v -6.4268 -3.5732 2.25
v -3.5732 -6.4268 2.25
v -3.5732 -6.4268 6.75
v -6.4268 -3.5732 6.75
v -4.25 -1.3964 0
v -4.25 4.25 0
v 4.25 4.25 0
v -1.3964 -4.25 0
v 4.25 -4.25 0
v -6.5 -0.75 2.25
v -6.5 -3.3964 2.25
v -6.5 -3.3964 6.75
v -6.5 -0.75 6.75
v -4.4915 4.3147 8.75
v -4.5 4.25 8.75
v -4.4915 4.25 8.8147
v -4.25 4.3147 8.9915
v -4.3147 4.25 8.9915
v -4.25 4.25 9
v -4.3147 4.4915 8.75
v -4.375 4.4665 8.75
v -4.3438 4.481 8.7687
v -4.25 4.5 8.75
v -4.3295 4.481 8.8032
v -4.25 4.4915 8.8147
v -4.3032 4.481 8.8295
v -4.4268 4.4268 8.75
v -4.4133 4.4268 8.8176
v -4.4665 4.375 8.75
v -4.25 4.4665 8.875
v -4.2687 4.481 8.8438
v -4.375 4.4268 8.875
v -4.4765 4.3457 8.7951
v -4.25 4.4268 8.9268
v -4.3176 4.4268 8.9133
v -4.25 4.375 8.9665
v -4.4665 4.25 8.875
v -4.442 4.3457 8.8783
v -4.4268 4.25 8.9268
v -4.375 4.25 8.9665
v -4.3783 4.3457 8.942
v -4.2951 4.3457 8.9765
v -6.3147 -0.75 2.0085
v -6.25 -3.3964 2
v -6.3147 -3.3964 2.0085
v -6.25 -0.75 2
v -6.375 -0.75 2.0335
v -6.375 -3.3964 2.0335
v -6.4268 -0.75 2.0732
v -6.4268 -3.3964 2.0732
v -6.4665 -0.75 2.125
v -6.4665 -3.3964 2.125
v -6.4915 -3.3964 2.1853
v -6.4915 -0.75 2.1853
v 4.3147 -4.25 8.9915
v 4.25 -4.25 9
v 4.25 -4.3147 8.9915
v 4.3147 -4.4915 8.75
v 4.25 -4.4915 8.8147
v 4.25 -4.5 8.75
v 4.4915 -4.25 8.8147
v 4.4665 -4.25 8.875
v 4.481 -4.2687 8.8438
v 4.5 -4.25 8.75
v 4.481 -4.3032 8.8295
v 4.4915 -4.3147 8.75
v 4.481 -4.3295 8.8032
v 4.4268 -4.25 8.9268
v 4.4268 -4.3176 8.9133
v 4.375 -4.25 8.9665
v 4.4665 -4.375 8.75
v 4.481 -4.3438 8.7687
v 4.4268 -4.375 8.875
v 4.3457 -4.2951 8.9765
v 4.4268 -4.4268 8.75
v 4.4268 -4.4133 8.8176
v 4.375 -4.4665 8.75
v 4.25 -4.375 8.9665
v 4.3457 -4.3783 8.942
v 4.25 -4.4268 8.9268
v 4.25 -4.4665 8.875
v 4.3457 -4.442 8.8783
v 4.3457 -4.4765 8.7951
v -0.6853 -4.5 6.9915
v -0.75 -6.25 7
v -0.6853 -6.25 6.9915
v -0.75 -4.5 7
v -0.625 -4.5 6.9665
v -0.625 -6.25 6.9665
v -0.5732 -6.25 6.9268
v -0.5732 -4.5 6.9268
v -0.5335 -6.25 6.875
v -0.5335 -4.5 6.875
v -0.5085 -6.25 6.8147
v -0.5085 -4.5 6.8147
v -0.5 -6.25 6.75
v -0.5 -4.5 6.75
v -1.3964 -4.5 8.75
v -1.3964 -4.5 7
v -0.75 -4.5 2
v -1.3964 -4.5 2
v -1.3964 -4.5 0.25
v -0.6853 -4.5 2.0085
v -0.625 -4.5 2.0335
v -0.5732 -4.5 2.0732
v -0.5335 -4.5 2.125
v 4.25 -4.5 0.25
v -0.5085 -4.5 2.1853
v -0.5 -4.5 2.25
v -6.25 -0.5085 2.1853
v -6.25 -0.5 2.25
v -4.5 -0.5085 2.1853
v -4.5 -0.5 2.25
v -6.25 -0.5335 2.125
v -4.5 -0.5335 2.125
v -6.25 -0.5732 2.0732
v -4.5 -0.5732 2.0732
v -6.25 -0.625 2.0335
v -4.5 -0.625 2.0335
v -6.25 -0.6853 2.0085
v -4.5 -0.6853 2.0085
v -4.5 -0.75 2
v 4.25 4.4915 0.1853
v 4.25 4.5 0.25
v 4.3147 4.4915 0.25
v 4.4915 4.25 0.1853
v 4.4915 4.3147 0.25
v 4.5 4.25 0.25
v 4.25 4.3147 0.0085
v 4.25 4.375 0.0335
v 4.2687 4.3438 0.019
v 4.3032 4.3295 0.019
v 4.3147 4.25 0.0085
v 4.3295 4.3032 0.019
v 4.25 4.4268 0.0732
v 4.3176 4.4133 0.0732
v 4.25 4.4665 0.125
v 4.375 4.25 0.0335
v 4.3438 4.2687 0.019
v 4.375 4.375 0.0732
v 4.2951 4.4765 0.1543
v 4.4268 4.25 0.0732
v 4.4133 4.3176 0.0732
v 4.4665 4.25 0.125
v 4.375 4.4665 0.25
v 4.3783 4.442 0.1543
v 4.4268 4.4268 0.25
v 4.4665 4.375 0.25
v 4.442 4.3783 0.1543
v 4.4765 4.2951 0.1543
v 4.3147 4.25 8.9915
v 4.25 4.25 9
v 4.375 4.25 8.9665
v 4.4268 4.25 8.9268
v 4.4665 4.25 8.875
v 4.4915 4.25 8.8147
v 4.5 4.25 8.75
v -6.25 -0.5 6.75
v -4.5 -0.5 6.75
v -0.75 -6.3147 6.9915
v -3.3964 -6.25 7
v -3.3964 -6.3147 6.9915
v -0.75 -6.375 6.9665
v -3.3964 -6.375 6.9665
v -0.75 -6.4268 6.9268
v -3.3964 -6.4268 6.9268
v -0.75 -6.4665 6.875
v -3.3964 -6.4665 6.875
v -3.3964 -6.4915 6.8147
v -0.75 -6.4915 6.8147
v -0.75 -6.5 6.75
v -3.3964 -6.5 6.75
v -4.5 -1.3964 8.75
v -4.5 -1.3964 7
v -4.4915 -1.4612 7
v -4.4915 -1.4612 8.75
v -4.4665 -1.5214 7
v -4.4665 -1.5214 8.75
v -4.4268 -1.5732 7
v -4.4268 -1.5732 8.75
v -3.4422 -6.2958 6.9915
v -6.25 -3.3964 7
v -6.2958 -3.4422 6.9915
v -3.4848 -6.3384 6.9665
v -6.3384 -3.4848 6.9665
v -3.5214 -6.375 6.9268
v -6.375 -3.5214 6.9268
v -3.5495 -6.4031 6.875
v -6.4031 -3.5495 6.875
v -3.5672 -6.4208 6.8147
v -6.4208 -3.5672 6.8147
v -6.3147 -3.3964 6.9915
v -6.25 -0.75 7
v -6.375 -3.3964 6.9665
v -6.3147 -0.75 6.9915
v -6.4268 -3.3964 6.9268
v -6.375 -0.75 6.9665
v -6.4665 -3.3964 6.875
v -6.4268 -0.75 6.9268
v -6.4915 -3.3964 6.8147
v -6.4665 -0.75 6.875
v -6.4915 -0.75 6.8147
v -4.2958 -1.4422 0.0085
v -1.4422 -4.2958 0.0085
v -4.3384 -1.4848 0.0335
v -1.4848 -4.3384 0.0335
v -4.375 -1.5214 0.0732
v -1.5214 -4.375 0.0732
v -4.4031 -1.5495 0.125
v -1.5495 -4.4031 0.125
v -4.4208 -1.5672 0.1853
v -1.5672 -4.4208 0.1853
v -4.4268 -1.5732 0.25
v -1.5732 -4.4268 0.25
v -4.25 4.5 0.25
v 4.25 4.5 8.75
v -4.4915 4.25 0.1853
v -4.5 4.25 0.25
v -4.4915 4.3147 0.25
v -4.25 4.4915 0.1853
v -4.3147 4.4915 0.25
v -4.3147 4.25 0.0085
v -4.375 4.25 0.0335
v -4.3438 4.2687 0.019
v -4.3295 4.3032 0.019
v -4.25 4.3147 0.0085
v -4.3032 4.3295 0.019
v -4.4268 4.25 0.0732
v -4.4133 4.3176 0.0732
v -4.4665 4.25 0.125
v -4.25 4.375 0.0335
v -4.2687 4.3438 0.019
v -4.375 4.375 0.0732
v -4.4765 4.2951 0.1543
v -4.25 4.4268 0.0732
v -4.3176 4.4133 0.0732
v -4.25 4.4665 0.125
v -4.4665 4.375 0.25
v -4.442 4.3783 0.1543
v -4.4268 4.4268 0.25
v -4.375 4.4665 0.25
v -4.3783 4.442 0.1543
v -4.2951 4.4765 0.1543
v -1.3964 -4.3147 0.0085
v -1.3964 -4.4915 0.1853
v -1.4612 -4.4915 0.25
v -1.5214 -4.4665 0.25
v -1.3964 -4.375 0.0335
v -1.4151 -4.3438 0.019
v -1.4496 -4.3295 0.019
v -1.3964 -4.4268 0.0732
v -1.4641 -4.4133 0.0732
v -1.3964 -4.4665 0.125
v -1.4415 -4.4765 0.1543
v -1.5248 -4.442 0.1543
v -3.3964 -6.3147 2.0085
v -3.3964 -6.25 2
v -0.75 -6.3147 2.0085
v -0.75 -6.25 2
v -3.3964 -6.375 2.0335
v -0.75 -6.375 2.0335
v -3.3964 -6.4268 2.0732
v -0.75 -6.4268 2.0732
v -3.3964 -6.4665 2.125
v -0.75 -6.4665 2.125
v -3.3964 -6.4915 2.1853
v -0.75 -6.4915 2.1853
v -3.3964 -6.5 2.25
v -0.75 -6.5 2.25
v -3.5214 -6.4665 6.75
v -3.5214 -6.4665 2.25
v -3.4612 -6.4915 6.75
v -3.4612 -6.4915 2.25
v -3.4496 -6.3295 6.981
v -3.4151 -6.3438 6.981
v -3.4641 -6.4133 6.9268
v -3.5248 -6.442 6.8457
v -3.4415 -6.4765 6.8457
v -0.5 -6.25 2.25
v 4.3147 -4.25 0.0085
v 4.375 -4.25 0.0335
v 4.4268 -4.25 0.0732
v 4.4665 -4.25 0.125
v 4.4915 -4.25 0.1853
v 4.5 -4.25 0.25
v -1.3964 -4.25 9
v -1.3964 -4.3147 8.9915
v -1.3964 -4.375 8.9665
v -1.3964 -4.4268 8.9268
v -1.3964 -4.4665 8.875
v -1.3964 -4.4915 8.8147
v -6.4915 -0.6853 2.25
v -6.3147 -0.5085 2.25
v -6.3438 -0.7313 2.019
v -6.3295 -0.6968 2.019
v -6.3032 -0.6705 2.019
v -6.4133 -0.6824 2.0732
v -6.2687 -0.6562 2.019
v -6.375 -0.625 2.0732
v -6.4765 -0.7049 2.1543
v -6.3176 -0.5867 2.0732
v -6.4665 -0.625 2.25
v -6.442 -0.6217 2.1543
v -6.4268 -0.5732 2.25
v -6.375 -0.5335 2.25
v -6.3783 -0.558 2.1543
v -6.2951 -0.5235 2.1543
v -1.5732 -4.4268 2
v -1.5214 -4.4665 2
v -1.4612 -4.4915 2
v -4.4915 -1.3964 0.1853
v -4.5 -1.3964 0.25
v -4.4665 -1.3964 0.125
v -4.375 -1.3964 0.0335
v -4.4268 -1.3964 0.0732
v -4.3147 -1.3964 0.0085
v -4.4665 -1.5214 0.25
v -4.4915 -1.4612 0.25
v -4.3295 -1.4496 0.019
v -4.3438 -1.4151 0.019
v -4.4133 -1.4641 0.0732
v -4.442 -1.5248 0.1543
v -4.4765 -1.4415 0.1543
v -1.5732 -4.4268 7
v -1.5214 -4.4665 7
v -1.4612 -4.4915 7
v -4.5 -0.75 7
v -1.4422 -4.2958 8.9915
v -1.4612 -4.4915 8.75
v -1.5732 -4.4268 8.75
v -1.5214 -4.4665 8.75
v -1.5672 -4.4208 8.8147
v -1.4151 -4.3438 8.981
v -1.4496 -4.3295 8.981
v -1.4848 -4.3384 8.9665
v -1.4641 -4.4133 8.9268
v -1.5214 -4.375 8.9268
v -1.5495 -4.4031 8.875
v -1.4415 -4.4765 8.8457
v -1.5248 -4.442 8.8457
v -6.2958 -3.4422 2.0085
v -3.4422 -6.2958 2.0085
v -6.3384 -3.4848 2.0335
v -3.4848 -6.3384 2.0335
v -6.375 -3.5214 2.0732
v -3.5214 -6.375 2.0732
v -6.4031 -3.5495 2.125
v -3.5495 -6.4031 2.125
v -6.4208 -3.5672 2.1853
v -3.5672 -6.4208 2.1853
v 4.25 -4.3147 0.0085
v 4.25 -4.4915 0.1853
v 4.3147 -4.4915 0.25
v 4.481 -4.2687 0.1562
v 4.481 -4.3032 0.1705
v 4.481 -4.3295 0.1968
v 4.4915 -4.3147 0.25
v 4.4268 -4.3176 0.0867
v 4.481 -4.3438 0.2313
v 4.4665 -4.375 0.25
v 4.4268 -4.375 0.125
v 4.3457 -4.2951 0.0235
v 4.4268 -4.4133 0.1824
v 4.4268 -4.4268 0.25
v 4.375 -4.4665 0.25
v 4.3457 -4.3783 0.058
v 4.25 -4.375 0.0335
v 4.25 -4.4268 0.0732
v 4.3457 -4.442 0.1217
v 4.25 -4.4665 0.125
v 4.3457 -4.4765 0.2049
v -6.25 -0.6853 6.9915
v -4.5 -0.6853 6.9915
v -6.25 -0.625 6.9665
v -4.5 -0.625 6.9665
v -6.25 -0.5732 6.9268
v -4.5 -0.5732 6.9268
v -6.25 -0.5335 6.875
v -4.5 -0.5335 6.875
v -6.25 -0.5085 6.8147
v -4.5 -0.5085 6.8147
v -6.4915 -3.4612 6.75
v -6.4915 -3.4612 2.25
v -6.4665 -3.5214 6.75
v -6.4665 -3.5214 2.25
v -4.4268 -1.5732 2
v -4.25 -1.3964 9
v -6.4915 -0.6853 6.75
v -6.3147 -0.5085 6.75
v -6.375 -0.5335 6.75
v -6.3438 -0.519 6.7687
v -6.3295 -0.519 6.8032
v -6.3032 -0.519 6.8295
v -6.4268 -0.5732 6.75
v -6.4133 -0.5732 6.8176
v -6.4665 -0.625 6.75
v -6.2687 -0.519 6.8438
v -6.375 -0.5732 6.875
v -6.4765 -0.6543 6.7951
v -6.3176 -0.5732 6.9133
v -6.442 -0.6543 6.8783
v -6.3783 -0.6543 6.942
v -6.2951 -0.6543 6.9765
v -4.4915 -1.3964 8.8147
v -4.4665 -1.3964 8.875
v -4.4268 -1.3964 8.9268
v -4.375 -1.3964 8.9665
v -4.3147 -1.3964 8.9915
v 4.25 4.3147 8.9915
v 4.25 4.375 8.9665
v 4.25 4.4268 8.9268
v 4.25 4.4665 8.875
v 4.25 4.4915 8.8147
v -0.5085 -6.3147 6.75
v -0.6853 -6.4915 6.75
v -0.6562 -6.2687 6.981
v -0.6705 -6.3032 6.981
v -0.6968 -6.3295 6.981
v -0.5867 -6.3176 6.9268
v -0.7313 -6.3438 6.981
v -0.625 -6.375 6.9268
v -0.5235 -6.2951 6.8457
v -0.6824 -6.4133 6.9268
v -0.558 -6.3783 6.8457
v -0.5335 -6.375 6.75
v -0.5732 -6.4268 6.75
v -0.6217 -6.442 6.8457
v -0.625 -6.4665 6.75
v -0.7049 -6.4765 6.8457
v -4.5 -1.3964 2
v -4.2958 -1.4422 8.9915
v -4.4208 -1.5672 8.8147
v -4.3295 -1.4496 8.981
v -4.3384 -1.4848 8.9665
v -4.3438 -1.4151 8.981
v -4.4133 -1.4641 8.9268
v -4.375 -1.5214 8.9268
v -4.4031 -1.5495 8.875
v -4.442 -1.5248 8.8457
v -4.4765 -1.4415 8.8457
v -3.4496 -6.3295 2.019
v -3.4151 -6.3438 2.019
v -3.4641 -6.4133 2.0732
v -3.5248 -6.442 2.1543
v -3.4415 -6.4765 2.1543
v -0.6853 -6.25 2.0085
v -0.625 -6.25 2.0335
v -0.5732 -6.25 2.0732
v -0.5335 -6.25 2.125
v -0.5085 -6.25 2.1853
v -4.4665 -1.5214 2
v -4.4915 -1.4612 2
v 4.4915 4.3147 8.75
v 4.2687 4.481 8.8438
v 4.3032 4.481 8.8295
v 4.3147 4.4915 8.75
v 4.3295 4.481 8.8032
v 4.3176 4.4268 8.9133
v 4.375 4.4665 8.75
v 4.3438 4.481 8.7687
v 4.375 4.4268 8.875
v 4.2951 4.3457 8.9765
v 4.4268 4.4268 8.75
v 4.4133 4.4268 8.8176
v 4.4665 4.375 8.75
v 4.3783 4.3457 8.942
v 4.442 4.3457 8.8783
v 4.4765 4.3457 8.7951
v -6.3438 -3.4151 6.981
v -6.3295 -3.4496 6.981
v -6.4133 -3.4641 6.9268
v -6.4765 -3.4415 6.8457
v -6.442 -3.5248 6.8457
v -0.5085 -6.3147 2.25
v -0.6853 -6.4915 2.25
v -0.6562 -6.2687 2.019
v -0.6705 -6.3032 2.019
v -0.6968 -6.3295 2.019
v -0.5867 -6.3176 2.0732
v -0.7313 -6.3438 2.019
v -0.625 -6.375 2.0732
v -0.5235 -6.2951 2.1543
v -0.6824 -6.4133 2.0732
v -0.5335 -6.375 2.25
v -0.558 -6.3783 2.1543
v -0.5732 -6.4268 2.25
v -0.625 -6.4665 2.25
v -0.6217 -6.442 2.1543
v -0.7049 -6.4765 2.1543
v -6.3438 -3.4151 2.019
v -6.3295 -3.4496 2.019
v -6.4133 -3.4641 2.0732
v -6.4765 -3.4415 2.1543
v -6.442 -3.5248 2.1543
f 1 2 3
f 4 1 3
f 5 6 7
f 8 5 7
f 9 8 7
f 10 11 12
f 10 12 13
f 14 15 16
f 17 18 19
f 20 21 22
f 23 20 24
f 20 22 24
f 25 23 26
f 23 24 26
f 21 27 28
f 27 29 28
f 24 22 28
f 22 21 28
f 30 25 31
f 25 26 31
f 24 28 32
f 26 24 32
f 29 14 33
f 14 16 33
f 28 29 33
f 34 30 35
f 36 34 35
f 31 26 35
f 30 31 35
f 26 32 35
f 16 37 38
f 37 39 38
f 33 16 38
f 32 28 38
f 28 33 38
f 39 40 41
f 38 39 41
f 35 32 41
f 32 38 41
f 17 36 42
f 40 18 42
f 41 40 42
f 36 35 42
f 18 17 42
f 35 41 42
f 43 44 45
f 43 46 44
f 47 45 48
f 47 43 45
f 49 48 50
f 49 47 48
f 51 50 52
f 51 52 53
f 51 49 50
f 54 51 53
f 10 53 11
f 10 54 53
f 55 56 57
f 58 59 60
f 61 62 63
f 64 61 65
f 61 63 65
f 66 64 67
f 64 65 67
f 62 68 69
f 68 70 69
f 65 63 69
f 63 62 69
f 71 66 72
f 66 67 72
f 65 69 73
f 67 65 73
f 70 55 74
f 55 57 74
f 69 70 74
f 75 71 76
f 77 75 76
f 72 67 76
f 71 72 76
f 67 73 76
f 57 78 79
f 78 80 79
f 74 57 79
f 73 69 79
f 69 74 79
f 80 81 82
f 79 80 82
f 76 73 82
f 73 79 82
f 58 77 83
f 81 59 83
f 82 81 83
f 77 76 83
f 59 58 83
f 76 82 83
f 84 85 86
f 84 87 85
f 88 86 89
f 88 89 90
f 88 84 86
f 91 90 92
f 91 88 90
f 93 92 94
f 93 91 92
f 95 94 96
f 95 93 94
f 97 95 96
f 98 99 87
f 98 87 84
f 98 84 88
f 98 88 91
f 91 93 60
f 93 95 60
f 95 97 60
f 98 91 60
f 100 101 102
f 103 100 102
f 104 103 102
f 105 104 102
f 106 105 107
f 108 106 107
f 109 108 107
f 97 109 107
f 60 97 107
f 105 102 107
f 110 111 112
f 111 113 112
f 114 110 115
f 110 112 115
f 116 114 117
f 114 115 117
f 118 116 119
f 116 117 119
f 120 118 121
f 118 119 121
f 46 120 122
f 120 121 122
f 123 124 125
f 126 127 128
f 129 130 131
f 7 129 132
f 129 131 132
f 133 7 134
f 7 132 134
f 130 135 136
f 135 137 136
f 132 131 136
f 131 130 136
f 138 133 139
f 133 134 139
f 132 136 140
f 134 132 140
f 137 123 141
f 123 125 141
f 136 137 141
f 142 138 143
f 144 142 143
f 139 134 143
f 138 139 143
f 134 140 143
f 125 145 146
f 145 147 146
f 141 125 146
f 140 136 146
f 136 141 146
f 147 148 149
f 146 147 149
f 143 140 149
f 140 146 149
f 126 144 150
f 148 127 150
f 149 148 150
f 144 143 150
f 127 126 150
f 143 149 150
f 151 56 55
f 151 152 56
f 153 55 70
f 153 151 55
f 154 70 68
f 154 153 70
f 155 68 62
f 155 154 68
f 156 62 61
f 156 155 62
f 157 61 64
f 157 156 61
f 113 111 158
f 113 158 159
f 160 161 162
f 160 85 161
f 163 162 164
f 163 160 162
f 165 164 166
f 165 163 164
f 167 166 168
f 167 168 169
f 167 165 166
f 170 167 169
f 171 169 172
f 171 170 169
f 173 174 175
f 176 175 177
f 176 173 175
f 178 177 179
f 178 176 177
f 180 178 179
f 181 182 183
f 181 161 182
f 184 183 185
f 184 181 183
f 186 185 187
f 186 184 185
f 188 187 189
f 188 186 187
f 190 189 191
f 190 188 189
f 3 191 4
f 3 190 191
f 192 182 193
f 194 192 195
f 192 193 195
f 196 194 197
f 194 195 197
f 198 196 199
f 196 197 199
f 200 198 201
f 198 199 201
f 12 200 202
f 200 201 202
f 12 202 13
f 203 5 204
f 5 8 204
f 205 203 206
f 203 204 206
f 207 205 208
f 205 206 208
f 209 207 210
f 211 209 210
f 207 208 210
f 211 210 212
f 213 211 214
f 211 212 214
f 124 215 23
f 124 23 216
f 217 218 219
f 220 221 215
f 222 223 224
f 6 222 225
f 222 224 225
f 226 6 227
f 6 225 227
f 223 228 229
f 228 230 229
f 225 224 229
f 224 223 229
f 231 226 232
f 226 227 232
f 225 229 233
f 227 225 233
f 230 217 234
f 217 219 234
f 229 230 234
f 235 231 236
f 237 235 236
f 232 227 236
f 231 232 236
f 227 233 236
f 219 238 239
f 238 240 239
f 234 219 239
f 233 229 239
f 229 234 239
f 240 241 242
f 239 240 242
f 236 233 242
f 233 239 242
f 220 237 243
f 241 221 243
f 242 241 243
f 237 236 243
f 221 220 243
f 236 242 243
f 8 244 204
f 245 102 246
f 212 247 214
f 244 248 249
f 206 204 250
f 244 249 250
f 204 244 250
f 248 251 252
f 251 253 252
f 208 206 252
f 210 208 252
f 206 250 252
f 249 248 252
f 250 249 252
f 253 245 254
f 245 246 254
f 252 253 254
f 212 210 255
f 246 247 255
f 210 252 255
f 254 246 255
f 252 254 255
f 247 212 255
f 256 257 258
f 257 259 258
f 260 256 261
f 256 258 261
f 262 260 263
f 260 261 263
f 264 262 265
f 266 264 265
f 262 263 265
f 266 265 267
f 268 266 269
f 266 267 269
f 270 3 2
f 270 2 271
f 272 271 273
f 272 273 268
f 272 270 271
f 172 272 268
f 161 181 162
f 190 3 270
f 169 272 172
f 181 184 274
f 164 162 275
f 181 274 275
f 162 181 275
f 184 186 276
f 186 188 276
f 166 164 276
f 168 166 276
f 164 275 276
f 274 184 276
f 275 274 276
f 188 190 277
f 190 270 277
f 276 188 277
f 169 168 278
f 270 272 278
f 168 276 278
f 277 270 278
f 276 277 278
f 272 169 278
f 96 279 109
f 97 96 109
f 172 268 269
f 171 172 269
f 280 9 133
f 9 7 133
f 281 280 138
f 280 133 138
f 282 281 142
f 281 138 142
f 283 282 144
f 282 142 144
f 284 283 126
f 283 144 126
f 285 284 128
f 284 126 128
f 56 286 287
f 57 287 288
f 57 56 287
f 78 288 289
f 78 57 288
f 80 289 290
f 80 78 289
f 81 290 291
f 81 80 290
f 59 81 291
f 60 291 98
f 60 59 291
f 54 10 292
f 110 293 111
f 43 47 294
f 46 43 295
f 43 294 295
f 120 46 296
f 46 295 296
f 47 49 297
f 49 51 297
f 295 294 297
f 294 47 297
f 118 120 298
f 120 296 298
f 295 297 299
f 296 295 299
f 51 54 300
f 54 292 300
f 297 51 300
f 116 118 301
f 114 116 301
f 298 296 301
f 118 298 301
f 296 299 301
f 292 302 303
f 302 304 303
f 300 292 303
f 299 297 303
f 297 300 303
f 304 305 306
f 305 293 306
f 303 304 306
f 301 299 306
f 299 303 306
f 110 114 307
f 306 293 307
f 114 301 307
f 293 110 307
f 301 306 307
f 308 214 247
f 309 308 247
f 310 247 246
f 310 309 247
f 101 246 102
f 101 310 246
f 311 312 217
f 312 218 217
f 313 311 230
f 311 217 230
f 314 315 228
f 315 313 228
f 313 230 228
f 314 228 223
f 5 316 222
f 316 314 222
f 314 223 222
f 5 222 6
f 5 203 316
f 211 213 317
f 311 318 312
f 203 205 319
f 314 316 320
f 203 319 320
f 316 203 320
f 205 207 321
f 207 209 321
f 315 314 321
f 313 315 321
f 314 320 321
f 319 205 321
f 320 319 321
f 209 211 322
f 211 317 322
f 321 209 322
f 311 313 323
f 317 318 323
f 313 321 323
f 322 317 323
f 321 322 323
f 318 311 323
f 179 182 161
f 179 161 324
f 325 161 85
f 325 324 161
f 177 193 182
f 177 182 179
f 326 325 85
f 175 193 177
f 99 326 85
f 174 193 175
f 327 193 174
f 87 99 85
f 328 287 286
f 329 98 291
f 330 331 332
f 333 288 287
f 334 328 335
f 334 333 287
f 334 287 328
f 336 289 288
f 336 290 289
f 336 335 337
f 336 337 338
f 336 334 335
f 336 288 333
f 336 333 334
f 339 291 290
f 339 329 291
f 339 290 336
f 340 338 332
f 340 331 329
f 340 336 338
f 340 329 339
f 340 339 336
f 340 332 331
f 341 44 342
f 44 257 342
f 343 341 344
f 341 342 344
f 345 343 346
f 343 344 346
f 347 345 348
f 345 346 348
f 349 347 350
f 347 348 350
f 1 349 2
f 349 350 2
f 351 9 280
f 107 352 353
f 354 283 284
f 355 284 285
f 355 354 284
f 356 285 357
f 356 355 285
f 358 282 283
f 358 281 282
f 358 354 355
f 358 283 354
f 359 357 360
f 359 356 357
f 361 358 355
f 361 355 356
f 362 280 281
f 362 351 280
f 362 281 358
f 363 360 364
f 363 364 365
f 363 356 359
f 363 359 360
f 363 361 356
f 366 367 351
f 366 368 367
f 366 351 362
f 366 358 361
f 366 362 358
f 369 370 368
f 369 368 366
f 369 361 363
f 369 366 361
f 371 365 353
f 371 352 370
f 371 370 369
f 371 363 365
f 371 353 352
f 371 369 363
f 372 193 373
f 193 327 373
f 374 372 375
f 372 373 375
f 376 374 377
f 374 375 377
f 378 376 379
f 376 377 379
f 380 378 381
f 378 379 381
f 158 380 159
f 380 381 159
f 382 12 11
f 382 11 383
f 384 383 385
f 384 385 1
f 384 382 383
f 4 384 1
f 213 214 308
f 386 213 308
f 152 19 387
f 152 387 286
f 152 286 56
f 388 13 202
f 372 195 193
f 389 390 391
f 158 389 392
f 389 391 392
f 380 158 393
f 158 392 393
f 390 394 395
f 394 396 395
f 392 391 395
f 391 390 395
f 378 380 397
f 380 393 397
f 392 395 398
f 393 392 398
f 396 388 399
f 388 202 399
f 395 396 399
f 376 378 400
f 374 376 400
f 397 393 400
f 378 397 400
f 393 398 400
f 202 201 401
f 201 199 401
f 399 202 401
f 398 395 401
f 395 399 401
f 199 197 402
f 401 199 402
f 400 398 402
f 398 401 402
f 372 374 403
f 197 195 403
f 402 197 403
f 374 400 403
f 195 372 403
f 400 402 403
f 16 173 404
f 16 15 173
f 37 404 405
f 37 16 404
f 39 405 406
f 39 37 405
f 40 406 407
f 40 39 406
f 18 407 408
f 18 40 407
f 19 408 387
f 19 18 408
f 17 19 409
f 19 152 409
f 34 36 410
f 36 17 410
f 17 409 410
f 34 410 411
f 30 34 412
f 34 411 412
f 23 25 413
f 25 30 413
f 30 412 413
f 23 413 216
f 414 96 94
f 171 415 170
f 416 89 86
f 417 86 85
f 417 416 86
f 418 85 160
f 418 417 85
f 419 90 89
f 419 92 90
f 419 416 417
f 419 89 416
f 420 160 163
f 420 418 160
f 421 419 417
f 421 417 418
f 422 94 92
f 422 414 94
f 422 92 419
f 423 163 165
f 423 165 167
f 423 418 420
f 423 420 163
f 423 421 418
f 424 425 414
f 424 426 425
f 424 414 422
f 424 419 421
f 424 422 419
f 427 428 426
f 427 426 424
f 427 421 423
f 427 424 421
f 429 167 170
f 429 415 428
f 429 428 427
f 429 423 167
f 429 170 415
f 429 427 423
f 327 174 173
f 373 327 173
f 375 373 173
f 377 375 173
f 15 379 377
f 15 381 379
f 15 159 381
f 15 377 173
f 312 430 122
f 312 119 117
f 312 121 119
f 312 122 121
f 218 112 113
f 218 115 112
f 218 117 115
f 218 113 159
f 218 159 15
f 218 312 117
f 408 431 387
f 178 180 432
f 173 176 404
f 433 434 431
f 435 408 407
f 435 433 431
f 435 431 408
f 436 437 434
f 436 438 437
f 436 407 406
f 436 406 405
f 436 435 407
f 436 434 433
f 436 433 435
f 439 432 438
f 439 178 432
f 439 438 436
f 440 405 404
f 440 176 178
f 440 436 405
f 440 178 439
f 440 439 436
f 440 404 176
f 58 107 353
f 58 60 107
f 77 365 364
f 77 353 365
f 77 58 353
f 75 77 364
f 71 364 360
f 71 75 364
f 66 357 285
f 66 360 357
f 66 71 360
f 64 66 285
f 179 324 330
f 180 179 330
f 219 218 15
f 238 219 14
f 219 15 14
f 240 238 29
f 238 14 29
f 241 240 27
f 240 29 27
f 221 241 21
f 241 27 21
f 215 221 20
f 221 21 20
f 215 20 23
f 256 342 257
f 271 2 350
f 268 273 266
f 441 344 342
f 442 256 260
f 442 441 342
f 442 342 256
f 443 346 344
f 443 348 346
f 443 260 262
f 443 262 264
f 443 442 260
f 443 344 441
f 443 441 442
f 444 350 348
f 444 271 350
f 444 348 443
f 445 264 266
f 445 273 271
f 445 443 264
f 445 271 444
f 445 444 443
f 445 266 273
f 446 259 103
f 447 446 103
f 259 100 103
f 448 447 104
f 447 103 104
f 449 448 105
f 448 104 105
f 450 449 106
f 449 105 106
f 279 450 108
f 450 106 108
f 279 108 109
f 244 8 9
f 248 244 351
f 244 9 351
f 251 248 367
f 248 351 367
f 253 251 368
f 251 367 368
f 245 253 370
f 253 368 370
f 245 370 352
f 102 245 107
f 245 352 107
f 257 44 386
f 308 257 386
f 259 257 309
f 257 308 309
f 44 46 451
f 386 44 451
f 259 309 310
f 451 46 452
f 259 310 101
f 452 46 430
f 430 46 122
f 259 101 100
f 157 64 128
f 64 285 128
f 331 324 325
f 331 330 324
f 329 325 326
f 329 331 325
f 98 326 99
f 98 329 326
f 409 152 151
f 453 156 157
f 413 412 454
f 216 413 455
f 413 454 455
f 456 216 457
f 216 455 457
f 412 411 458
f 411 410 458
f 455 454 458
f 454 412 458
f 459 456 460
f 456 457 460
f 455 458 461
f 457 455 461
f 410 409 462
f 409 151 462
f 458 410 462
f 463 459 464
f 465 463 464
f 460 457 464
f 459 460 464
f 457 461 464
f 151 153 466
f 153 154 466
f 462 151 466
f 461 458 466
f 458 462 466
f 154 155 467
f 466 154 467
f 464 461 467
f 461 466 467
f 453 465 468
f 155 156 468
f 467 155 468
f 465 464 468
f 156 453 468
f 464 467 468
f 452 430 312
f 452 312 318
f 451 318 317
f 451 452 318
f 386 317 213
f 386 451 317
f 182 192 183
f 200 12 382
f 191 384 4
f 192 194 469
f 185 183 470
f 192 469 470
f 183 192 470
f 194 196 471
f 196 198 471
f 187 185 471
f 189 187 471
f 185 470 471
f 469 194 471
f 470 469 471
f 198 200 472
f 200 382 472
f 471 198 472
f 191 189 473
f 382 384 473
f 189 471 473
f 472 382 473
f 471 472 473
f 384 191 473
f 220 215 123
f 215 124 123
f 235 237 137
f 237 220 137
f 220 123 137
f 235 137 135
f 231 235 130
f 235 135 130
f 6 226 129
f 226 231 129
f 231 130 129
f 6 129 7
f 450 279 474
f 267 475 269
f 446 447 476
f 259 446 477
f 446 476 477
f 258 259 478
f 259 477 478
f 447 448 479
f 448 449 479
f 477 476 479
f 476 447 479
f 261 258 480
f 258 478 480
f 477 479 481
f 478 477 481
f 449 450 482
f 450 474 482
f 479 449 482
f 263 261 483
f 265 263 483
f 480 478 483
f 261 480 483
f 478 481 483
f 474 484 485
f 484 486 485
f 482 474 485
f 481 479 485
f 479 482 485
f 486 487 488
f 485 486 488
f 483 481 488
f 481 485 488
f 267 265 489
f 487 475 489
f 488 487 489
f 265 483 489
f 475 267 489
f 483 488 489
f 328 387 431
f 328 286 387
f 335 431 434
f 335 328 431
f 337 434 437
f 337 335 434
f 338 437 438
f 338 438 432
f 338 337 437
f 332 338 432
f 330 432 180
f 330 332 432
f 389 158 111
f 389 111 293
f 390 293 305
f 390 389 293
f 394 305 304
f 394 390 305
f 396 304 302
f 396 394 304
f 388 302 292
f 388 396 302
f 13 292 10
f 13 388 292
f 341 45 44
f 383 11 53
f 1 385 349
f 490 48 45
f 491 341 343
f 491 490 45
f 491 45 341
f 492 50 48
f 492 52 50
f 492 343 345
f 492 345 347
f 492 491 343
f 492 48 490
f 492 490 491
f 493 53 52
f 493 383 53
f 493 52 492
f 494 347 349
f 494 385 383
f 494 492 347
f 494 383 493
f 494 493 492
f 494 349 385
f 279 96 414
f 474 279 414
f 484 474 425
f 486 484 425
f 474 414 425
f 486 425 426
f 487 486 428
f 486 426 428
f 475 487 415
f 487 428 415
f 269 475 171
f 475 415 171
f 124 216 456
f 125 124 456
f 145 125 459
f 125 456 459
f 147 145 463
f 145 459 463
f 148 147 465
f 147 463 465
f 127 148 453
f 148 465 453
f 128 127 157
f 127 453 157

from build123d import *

# Parameters (mm, degrees)
F0_W     = 9
F0_H     = 9
F1_DEPTH = 9
F3_START = 2
F2_W     = 6
F2_H     = 6
F3_DEPTH = 5
F4_SIZE  = 3
F5_SIZE  = 3
F6_SIZE  = 3
F9_R     = 0.25


# Not quite as in the source:
# - a feature of the source that left no trace in its solid (it failed there, or was rolled back) is left out


with BuildPart() as f1:
    # F0 (on Top) → F1 (new body)
    with BuildSketch(Plane.XY):
        Rectangle(F0_W, F0_H)
    extrude(amount=F1_DEPTH)

    # F2 (on Top) → F3 (join)
    with BuildSketch(Plane.XY.offset(F3_START)):
        with Locations((-3.5, -3.5)):
            Rectangle(F2_W, F2_H)
    extrude(amount=F3_DEPTH)

    # F4
    f4_edges = [f1.edges().sort_by_distance(p)[0] for p in [
        (-4.5, -4.5, 1),
    ]]
    chamfer(f4_edges, length=F4_SIZE)

    # F5
    f5_edges = [f1.edges().sort_by_distance(p)[0] for p in [
        (-6.5, -6.5, 4.5),
    ]]
    chamfer(f5_edges, length=F5_SIZE)

    # F6
    f6_edges = [f1.edges().sort_by_distance(p)[0] for p in [
        (-4.5, -4.5, 8),
    ]]
    chamfer(f6_edges, length=F6_SIZE)

    # F9
    f9_edges = [f1.edges().sort_by_distance(p)[0] for p in [
        (-0.5, -6.5, 4.5),
        (-0.5, -5.5, 7),
        (-0.5, -5.5, 2),
        (-2, -6.5, 2),
        (-2, -6.5, 7),
        (-3.5, -6.5, 4.5),
        (-5, -5, 7),
        (-5, -5, 2),
        (-6.5, -3.5, 4.5),
        (-6.5, -2, 7),
        (-6.5, -0.5, 4.5),
        (-6.5, -2, 2),
        (-5.5, -0.5, 2),
        (-5.5, -0.5, 7),
        (-4.5, 1.5, 9),
        (-4.5, -1.5, 8),
        (-4.5, 4.5, 4.5),
        (-4.5, 1.5, 0),
        (-4.5, -1.5, 1),
        (1.5, -4.5, 9),
        (-3, -3, 9),
        (4.5, 0, 9),
        (0, 4.5, 9),
        (-1.5, -4.5, 8),
        (4.5, 4.5, 4.5),
        (0, 4.5, 0),
        (1.5, -4.5, 0),
        (-3, -3, 0),
        (4.5, 0, 0),
        (-1.5, -4.5, 1),
        (4.5, -4.5, 4.5),
    ]]
    fillet(f9_edges, radius=F9_R)


solid = f1.part
